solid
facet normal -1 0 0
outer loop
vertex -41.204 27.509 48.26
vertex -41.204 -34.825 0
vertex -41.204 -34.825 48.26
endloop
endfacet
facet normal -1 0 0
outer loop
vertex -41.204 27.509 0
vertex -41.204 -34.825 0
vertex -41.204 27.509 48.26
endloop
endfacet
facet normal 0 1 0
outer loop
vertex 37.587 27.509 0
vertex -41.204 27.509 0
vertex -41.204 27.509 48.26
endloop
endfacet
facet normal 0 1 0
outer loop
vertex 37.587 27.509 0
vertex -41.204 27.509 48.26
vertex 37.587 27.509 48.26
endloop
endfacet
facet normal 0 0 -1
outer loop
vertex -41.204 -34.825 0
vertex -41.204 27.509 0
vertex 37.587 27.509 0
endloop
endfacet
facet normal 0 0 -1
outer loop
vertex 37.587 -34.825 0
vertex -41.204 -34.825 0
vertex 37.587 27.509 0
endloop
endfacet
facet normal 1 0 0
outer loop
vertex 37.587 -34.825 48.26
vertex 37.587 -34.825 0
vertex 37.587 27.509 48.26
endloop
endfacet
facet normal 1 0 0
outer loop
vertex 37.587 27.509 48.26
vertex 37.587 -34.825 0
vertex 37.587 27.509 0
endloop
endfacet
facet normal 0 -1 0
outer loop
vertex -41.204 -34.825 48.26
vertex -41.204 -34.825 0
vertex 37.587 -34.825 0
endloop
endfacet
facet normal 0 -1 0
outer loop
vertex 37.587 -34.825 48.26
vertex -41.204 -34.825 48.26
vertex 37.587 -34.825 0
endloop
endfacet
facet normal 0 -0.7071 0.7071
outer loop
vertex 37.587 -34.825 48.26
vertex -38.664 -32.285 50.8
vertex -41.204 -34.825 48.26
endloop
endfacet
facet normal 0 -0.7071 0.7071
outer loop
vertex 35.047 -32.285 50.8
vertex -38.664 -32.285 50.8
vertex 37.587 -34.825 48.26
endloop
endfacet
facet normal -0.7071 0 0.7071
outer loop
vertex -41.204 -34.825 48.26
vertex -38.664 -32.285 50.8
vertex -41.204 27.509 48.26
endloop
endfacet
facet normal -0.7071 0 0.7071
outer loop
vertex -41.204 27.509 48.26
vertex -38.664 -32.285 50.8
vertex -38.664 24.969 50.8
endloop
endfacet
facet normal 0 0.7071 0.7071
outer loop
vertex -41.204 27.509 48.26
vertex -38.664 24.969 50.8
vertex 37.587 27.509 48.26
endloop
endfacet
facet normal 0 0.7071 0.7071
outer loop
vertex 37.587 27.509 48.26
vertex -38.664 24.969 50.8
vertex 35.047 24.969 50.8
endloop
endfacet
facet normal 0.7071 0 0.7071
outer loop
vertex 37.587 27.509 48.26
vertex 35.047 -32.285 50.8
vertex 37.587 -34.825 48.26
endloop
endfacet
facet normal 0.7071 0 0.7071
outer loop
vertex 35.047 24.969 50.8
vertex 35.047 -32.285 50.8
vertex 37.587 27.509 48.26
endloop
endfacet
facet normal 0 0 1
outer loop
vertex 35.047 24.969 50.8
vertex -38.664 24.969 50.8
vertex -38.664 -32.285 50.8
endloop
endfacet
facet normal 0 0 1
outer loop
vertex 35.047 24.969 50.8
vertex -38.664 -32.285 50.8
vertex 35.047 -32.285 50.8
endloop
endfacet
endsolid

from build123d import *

# Parameters (mm, degrees)
F0_W     = 78.791332
F0_H     = 62.333833
F1_DEPTH = 50.8
F2_SIZE2 = 2.54
F2_SIZE  = 2.54


with BuildPart() as f1:
    # F0 (on Top) → F1 (new body)
    with BuildSketch(Plane.XY):
        with Locations((-1.808798, -3.658226)):
            Rectangle(F0_W, F0_H)
    extrude(amount=F1_DEPTH)

    # F2
    f2_edges = [f1.edges().sort_by_distance(p)[0] for p in [
        (-1.808798, 27.508691, 50.8),
        (-41.204464, -3.658226, 50.8),
        (-1.808798, -34.825142, 50.8),
        (37.586868, -3.658226, 50.8),
    ]]
    chamfer(f2_edges, length=F2_SIZE, length2=F2_SIZE2)


solid = f1.part
